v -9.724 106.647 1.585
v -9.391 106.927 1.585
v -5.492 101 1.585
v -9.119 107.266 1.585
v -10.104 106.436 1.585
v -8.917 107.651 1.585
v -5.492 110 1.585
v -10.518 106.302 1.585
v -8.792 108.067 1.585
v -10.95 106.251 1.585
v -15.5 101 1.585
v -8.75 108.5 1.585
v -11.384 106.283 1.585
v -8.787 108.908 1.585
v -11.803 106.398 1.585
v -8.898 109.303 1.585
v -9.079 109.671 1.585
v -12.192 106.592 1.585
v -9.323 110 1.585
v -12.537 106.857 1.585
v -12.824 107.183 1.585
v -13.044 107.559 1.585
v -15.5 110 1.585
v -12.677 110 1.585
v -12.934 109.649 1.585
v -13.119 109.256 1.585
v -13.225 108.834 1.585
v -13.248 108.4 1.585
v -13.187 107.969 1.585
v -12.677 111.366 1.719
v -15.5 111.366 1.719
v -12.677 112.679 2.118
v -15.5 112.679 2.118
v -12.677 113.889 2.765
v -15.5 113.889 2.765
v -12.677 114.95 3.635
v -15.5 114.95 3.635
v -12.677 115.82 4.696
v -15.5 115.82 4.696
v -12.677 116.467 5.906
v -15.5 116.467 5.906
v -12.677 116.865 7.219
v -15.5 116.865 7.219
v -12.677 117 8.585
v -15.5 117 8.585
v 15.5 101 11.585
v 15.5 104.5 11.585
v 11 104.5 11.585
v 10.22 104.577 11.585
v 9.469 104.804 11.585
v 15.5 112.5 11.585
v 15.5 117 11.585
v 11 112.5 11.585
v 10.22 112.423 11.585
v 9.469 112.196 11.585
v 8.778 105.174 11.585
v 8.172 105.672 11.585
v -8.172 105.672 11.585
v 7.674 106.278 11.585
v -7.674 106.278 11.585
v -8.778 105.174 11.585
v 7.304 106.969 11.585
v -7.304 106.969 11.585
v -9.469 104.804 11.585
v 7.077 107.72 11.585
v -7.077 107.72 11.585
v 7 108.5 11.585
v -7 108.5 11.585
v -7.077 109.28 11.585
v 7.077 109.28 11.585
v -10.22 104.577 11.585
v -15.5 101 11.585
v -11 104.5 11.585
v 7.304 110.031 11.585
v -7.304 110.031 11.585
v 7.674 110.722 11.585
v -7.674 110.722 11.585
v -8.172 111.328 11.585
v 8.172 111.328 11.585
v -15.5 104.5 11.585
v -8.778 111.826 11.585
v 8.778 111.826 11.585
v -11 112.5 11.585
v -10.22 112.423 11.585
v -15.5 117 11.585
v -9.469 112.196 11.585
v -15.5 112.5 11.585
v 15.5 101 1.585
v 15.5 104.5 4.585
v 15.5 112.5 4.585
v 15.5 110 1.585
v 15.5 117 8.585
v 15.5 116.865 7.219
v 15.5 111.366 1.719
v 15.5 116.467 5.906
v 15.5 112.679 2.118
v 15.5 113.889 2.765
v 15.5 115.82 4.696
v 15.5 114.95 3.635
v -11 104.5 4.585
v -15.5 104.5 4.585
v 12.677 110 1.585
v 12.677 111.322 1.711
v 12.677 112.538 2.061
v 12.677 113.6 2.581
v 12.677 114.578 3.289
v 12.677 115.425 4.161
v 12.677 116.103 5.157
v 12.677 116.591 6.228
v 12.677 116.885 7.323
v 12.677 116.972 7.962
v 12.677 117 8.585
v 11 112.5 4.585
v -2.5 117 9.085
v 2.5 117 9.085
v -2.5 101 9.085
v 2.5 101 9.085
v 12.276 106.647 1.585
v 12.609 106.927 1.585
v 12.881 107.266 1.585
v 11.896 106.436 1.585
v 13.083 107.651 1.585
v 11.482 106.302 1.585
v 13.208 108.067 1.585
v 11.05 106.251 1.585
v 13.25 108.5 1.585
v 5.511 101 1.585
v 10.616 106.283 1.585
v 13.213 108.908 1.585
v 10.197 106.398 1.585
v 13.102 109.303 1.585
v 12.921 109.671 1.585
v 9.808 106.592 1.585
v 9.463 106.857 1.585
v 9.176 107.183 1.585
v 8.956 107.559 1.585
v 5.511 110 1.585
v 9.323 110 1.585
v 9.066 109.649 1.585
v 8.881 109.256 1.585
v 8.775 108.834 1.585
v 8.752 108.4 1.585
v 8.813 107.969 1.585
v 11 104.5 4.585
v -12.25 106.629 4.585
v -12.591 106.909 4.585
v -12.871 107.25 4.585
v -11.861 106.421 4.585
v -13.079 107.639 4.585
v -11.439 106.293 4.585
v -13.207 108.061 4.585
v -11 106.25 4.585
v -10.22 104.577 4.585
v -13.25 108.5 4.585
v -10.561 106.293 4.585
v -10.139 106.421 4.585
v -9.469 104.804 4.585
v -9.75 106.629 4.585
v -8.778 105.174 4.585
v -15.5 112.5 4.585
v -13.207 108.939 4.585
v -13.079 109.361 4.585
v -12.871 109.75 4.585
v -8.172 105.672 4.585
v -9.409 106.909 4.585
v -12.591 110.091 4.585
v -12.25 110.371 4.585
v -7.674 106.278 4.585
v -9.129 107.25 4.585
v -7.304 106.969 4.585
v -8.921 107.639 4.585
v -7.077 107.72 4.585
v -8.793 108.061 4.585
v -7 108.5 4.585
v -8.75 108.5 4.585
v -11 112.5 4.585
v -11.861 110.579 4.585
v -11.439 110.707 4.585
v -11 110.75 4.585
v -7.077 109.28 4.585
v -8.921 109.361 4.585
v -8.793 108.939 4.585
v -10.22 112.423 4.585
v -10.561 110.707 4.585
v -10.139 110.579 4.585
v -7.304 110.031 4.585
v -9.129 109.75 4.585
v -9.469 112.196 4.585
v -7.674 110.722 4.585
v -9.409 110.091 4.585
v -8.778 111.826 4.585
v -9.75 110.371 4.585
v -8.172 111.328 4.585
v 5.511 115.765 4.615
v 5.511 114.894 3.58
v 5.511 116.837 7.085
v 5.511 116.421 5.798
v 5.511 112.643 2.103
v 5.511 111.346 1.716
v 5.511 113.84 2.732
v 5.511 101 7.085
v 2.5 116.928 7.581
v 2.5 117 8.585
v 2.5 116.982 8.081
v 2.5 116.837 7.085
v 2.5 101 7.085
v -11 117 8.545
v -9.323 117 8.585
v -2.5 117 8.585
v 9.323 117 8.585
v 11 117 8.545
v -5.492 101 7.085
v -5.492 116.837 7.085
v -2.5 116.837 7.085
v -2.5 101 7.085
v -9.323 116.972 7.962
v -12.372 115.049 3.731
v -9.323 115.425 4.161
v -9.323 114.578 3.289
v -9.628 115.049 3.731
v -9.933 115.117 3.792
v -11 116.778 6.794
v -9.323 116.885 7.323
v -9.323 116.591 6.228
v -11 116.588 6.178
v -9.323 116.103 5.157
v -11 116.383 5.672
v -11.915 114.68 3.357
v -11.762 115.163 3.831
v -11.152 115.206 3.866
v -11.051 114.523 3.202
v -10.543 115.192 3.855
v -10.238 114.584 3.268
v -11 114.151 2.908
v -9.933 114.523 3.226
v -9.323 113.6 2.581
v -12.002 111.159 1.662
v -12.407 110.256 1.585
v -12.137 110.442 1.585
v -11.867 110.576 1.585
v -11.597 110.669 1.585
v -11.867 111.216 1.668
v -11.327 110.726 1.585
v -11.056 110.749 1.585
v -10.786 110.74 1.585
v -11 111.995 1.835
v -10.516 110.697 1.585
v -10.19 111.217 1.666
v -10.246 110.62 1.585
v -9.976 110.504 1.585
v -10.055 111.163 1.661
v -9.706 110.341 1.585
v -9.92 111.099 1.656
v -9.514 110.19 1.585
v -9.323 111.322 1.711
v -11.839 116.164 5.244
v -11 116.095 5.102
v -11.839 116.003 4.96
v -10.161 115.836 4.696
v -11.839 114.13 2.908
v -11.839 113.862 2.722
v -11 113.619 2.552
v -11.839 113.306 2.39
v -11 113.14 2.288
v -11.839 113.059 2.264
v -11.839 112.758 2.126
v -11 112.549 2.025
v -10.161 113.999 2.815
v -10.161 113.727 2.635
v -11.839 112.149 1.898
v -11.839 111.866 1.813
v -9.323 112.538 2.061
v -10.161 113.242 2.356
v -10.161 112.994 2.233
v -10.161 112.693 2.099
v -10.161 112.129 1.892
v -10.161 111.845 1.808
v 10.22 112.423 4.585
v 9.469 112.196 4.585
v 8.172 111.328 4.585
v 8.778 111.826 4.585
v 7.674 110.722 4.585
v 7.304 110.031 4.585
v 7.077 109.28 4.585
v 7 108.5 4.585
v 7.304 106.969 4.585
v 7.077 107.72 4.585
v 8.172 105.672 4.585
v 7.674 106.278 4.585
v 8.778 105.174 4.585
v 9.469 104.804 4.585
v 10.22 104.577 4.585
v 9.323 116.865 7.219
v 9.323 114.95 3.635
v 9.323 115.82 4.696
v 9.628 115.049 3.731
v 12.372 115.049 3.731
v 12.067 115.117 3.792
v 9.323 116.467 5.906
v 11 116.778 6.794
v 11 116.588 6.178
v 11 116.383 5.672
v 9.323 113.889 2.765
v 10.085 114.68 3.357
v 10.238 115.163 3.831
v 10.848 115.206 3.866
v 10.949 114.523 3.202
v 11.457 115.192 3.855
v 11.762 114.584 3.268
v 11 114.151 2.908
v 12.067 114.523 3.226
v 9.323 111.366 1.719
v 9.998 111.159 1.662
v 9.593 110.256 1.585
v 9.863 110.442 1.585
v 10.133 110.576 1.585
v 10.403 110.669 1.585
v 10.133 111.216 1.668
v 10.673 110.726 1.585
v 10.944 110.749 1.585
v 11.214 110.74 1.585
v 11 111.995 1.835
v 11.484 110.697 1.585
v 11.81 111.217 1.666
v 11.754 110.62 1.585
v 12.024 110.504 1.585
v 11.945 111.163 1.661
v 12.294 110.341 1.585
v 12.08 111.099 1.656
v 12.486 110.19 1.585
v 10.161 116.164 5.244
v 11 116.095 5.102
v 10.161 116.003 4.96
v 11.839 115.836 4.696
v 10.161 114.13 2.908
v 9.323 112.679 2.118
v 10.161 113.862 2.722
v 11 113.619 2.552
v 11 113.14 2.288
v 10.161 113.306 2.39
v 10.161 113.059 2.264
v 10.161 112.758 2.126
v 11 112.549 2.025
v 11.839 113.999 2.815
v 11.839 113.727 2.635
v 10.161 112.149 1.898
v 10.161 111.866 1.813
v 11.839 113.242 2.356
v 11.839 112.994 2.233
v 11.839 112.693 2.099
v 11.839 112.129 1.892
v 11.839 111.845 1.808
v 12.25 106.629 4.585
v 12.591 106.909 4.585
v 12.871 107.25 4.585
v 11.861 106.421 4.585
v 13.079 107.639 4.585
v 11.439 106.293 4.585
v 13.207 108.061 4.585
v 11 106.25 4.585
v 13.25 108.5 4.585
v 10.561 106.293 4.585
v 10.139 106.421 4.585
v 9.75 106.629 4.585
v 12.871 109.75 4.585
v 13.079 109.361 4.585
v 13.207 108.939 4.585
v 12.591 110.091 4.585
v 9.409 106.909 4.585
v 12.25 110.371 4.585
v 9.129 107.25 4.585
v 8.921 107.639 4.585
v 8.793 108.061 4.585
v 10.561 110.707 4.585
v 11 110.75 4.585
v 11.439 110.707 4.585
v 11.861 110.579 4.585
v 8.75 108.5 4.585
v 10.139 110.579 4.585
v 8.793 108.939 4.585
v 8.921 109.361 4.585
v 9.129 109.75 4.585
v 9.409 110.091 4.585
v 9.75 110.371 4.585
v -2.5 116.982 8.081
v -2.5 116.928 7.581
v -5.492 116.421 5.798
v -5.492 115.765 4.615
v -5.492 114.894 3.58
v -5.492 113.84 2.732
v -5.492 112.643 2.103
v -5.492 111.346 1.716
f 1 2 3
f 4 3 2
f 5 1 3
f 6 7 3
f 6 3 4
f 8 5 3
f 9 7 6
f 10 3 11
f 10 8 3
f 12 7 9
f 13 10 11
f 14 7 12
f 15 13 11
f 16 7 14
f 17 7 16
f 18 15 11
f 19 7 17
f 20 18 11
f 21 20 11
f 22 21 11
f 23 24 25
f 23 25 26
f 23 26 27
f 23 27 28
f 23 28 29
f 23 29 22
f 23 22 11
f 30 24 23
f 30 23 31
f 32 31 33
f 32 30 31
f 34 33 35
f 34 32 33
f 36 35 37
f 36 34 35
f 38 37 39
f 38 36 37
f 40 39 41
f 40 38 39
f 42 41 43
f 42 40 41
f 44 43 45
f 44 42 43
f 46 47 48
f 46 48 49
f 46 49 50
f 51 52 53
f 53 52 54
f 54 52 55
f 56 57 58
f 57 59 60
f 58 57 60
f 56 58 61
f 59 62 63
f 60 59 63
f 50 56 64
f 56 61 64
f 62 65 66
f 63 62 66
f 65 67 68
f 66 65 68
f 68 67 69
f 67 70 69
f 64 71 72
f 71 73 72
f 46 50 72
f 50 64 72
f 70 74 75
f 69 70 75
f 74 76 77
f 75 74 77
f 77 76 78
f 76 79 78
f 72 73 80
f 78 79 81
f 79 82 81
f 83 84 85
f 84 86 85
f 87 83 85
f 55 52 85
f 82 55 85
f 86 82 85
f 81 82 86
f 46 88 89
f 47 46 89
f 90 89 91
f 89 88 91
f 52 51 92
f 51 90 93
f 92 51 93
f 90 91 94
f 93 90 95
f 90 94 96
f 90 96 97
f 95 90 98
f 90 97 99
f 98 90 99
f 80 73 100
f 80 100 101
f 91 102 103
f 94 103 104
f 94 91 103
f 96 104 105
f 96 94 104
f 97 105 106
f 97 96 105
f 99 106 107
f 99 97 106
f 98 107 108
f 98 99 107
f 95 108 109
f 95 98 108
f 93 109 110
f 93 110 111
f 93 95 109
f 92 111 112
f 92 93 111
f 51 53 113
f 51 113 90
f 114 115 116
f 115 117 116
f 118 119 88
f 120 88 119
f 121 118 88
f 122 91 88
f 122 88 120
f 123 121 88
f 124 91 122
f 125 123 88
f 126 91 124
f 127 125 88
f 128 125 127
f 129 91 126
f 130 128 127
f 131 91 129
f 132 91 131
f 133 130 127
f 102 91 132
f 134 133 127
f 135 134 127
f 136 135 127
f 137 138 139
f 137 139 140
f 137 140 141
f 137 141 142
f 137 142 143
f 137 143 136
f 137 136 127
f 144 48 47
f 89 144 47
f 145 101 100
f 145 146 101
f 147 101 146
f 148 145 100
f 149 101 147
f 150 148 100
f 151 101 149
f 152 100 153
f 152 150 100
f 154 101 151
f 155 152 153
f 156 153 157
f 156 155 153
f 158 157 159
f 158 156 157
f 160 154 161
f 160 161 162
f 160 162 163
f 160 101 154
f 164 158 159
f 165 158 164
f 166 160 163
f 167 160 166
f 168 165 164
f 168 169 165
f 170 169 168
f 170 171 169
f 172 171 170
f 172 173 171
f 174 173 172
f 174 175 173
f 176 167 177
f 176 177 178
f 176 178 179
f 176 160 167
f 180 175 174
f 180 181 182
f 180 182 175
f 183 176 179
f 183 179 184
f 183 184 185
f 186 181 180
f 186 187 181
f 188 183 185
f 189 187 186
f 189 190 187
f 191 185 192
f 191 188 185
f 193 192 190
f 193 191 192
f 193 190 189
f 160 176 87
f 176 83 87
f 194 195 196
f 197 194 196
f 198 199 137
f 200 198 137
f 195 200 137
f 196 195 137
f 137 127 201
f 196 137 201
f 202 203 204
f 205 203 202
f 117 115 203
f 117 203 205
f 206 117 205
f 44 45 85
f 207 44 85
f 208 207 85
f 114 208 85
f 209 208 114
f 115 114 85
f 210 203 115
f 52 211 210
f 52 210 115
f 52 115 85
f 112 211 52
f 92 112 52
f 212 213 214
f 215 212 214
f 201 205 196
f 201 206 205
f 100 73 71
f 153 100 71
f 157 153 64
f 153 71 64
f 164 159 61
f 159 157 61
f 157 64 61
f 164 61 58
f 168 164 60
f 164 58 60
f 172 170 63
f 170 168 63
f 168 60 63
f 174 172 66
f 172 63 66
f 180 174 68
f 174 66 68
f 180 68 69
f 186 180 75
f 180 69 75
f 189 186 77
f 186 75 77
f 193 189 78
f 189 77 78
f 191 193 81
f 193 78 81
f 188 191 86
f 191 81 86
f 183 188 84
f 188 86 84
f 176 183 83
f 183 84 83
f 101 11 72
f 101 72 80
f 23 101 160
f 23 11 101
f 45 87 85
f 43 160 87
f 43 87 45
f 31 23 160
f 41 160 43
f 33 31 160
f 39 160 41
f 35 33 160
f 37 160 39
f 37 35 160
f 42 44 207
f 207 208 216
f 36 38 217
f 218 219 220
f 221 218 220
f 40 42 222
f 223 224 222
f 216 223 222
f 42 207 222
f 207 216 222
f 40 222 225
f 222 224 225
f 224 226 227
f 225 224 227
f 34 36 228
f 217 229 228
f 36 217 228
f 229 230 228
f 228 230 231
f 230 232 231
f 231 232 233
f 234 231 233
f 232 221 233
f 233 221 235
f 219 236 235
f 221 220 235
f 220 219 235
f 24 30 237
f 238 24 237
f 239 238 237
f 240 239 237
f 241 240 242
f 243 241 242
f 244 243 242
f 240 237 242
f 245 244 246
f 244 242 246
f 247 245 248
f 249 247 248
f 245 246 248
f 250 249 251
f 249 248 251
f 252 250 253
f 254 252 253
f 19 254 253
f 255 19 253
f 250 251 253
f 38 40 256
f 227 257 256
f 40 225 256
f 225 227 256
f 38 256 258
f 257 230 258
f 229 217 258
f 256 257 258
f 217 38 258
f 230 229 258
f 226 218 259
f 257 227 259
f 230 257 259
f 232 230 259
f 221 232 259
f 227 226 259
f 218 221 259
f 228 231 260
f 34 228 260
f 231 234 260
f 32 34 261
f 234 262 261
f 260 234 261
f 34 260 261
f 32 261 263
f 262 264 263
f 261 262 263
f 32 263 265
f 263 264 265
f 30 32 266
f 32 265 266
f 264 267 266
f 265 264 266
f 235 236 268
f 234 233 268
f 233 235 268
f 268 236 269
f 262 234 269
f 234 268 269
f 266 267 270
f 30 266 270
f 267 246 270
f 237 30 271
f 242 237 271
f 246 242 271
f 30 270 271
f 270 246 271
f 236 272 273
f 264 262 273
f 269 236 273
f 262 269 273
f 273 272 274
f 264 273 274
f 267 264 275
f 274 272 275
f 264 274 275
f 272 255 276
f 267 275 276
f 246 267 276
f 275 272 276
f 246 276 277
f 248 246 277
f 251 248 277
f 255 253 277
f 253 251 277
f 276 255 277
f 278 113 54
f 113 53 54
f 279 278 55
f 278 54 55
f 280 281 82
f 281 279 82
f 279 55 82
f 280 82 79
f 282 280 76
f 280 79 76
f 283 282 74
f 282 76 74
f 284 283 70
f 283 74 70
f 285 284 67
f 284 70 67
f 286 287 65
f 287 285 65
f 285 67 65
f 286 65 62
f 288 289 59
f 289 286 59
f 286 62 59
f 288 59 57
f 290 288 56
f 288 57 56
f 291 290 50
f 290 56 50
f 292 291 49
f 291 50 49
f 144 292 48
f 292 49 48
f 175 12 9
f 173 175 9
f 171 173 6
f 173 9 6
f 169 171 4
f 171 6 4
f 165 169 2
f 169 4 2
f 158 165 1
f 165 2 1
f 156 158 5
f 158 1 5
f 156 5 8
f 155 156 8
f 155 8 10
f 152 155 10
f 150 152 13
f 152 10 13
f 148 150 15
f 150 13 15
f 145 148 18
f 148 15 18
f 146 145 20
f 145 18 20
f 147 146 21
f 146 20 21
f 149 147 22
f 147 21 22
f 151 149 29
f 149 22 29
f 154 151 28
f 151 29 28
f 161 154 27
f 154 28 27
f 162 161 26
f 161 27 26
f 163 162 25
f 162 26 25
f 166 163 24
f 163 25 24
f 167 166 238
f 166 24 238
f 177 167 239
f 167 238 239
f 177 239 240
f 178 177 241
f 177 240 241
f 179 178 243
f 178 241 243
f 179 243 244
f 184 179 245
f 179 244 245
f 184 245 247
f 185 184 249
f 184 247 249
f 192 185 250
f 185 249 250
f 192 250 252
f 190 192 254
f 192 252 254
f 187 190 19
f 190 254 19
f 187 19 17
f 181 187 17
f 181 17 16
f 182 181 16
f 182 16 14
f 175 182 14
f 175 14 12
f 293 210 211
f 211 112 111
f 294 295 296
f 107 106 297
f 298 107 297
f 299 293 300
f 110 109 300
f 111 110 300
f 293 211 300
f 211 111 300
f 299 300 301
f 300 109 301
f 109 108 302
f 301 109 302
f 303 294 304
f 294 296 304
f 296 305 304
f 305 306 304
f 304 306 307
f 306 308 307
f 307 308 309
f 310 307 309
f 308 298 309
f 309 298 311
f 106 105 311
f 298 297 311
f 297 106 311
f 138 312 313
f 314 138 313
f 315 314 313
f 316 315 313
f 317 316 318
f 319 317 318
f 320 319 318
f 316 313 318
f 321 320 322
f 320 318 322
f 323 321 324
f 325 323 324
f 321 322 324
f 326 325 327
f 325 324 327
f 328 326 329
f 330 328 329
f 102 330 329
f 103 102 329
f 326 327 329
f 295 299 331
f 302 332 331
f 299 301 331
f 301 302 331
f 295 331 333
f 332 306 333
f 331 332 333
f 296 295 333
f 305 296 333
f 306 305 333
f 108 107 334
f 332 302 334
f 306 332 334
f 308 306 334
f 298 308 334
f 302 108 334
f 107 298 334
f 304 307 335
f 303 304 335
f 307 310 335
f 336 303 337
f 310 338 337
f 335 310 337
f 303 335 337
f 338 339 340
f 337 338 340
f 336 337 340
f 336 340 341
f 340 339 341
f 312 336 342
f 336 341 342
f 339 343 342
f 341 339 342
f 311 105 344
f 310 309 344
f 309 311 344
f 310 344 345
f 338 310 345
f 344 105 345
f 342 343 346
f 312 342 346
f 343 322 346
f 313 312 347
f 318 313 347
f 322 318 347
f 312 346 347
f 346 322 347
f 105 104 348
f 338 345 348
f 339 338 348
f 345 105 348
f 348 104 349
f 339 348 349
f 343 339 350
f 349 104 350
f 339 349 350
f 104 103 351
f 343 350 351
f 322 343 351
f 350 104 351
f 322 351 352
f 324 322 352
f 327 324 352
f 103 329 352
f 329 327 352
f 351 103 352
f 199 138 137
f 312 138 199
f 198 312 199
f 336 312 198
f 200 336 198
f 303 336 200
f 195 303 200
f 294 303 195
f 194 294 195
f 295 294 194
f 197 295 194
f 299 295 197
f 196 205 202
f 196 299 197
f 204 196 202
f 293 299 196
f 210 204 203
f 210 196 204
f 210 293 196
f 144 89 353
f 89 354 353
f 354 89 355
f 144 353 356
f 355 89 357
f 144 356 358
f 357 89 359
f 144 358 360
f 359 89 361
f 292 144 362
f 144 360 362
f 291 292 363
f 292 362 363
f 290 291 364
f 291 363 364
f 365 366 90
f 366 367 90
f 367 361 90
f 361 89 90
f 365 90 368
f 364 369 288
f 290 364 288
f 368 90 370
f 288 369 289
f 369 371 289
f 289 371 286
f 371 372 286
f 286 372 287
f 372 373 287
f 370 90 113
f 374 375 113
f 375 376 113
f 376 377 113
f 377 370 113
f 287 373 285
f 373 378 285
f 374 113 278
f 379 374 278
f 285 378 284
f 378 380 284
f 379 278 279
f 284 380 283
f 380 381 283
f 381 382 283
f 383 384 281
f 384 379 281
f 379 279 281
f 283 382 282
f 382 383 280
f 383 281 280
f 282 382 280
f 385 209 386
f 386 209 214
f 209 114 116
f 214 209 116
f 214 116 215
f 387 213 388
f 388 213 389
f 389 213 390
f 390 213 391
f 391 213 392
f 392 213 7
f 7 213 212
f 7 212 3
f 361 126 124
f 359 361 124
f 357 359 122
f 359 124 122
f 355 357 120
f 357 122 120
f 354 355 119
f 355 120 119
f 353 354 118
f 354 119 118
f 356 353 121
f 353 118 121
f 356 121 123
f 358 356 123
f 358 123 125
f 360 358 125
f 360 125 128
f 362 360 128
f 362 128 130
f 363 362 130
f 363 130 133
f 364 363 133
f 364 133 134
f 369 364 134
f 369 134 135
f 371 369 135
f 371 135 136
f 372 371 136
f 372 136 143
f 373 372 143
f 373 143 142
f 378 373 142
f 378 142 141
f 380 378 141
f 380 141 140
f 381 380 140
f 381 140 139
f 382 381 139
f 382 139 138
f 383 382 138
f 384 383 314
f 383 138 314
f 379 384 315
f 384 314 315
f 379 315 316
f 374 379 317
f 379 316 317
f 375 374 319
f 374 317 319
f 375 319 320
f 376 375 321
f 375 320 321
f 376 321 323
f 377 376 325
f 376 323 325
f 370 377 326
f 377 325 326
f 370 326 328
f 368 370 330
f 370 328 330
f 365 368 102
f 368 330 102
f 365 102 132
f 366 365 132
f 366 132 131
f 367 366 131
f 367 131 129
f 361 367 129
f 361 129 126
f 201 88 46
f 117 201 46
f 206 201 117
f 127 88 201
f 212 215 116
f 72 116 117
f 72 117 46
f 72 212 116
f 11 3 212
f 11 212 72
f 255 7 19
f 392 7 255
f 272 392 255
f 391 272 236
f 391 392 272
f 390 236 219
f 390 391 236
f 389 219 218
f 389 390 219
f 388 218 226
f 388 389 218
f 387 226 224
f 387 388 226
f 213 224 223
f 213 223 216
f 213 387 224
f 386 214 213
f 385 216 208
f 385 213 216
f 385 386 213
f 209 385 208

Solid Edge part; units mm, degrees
sketch "Sketch1" plane through (0, 0, 1.5849) normal (0, 0, 1) x (1, 0, 0)
  line L0 (15.5, 101) -> (-15.5, 101)
  line L1 (-15.5, 101) -> (-15.5, 117)
  line L2 (-15.5, 117) -> (15.5, 117)
  line L3 (15.5, 101) -> (15.5, 117)
extrude "Protrusion1" add sketch "Sketch1" along normal blind 10
sketch "Sketch2" plane through (0, 0, 1.5849) normal (0, 0, 1) x (1, 0, 0)
  circle A0 centre (11, 108.5) radius 2.25
  circle A1 centre (-11, 108.5) radius 2.25
extrude "Cutout1" cut sketch "Sketch2" along normal up to next
sketch "Sketch3" plane through (0, 101, 13.75) normal (0, -1, 0) x (1, 0, 0)
  line L0 (2.5, -6.6651) -> (5.5112, -6.6651)
  line L1 (5.5112, -12.1651) -> (5.5112, -6.6651)
  line L2 (-5.4918, -12.1651) -> (5.5112, -12.1651)
  line L3 (-5.4918, -6.6651) -> (-5.4918, -12.1651)
  line L4 (-5.4918, -6.6651) -> (-2.5, -6.6651)
  line L5 (-2.5, -4.6651) -> (-2.5, -6.6651)
  line L6 (2.5, -4.6651) -> (-2.5, -4.6651)
  line L7 (2.5, -4.6651) -> (2.5, -6.6651)
extrude "Cutout2" cut sketch "Sketch3" against normal up to next
sketch "Sketch4" plane through (0, 109, 11.5849) normal (0, 0, 1) x (1, 0, 0)
  line L0 (-15.5, 3.5) -> (-15.5, -4.5)
  line L1 (-11, -4.5) -> (-15.5, -4.5)
  line L2 (-11, 3.5) -> (-15.5, 3.5)
  arc A0 (-11, 3.5) -> (-11, -4.5) centre (-11, -0.5) cw
  line L3 (11, 3.5) -> (15.5, 3.5)
  line L4 (15.5, 3.5) -> (15.5, -4.5)
  line L5 (11, -4.5) -> (15.5, -4.5)
  arc A1 (11, -4.5) -> (11, 3.5) centre (11, -0.5) cw
extrude "ExtrudedCutout_3" cut sketch "Sketch4" against normal blind 7
fillet "Round_1" radius 7 2 edges at (10.5056, 117, 1.5849) (-10.4959, 117, 1.5849)
